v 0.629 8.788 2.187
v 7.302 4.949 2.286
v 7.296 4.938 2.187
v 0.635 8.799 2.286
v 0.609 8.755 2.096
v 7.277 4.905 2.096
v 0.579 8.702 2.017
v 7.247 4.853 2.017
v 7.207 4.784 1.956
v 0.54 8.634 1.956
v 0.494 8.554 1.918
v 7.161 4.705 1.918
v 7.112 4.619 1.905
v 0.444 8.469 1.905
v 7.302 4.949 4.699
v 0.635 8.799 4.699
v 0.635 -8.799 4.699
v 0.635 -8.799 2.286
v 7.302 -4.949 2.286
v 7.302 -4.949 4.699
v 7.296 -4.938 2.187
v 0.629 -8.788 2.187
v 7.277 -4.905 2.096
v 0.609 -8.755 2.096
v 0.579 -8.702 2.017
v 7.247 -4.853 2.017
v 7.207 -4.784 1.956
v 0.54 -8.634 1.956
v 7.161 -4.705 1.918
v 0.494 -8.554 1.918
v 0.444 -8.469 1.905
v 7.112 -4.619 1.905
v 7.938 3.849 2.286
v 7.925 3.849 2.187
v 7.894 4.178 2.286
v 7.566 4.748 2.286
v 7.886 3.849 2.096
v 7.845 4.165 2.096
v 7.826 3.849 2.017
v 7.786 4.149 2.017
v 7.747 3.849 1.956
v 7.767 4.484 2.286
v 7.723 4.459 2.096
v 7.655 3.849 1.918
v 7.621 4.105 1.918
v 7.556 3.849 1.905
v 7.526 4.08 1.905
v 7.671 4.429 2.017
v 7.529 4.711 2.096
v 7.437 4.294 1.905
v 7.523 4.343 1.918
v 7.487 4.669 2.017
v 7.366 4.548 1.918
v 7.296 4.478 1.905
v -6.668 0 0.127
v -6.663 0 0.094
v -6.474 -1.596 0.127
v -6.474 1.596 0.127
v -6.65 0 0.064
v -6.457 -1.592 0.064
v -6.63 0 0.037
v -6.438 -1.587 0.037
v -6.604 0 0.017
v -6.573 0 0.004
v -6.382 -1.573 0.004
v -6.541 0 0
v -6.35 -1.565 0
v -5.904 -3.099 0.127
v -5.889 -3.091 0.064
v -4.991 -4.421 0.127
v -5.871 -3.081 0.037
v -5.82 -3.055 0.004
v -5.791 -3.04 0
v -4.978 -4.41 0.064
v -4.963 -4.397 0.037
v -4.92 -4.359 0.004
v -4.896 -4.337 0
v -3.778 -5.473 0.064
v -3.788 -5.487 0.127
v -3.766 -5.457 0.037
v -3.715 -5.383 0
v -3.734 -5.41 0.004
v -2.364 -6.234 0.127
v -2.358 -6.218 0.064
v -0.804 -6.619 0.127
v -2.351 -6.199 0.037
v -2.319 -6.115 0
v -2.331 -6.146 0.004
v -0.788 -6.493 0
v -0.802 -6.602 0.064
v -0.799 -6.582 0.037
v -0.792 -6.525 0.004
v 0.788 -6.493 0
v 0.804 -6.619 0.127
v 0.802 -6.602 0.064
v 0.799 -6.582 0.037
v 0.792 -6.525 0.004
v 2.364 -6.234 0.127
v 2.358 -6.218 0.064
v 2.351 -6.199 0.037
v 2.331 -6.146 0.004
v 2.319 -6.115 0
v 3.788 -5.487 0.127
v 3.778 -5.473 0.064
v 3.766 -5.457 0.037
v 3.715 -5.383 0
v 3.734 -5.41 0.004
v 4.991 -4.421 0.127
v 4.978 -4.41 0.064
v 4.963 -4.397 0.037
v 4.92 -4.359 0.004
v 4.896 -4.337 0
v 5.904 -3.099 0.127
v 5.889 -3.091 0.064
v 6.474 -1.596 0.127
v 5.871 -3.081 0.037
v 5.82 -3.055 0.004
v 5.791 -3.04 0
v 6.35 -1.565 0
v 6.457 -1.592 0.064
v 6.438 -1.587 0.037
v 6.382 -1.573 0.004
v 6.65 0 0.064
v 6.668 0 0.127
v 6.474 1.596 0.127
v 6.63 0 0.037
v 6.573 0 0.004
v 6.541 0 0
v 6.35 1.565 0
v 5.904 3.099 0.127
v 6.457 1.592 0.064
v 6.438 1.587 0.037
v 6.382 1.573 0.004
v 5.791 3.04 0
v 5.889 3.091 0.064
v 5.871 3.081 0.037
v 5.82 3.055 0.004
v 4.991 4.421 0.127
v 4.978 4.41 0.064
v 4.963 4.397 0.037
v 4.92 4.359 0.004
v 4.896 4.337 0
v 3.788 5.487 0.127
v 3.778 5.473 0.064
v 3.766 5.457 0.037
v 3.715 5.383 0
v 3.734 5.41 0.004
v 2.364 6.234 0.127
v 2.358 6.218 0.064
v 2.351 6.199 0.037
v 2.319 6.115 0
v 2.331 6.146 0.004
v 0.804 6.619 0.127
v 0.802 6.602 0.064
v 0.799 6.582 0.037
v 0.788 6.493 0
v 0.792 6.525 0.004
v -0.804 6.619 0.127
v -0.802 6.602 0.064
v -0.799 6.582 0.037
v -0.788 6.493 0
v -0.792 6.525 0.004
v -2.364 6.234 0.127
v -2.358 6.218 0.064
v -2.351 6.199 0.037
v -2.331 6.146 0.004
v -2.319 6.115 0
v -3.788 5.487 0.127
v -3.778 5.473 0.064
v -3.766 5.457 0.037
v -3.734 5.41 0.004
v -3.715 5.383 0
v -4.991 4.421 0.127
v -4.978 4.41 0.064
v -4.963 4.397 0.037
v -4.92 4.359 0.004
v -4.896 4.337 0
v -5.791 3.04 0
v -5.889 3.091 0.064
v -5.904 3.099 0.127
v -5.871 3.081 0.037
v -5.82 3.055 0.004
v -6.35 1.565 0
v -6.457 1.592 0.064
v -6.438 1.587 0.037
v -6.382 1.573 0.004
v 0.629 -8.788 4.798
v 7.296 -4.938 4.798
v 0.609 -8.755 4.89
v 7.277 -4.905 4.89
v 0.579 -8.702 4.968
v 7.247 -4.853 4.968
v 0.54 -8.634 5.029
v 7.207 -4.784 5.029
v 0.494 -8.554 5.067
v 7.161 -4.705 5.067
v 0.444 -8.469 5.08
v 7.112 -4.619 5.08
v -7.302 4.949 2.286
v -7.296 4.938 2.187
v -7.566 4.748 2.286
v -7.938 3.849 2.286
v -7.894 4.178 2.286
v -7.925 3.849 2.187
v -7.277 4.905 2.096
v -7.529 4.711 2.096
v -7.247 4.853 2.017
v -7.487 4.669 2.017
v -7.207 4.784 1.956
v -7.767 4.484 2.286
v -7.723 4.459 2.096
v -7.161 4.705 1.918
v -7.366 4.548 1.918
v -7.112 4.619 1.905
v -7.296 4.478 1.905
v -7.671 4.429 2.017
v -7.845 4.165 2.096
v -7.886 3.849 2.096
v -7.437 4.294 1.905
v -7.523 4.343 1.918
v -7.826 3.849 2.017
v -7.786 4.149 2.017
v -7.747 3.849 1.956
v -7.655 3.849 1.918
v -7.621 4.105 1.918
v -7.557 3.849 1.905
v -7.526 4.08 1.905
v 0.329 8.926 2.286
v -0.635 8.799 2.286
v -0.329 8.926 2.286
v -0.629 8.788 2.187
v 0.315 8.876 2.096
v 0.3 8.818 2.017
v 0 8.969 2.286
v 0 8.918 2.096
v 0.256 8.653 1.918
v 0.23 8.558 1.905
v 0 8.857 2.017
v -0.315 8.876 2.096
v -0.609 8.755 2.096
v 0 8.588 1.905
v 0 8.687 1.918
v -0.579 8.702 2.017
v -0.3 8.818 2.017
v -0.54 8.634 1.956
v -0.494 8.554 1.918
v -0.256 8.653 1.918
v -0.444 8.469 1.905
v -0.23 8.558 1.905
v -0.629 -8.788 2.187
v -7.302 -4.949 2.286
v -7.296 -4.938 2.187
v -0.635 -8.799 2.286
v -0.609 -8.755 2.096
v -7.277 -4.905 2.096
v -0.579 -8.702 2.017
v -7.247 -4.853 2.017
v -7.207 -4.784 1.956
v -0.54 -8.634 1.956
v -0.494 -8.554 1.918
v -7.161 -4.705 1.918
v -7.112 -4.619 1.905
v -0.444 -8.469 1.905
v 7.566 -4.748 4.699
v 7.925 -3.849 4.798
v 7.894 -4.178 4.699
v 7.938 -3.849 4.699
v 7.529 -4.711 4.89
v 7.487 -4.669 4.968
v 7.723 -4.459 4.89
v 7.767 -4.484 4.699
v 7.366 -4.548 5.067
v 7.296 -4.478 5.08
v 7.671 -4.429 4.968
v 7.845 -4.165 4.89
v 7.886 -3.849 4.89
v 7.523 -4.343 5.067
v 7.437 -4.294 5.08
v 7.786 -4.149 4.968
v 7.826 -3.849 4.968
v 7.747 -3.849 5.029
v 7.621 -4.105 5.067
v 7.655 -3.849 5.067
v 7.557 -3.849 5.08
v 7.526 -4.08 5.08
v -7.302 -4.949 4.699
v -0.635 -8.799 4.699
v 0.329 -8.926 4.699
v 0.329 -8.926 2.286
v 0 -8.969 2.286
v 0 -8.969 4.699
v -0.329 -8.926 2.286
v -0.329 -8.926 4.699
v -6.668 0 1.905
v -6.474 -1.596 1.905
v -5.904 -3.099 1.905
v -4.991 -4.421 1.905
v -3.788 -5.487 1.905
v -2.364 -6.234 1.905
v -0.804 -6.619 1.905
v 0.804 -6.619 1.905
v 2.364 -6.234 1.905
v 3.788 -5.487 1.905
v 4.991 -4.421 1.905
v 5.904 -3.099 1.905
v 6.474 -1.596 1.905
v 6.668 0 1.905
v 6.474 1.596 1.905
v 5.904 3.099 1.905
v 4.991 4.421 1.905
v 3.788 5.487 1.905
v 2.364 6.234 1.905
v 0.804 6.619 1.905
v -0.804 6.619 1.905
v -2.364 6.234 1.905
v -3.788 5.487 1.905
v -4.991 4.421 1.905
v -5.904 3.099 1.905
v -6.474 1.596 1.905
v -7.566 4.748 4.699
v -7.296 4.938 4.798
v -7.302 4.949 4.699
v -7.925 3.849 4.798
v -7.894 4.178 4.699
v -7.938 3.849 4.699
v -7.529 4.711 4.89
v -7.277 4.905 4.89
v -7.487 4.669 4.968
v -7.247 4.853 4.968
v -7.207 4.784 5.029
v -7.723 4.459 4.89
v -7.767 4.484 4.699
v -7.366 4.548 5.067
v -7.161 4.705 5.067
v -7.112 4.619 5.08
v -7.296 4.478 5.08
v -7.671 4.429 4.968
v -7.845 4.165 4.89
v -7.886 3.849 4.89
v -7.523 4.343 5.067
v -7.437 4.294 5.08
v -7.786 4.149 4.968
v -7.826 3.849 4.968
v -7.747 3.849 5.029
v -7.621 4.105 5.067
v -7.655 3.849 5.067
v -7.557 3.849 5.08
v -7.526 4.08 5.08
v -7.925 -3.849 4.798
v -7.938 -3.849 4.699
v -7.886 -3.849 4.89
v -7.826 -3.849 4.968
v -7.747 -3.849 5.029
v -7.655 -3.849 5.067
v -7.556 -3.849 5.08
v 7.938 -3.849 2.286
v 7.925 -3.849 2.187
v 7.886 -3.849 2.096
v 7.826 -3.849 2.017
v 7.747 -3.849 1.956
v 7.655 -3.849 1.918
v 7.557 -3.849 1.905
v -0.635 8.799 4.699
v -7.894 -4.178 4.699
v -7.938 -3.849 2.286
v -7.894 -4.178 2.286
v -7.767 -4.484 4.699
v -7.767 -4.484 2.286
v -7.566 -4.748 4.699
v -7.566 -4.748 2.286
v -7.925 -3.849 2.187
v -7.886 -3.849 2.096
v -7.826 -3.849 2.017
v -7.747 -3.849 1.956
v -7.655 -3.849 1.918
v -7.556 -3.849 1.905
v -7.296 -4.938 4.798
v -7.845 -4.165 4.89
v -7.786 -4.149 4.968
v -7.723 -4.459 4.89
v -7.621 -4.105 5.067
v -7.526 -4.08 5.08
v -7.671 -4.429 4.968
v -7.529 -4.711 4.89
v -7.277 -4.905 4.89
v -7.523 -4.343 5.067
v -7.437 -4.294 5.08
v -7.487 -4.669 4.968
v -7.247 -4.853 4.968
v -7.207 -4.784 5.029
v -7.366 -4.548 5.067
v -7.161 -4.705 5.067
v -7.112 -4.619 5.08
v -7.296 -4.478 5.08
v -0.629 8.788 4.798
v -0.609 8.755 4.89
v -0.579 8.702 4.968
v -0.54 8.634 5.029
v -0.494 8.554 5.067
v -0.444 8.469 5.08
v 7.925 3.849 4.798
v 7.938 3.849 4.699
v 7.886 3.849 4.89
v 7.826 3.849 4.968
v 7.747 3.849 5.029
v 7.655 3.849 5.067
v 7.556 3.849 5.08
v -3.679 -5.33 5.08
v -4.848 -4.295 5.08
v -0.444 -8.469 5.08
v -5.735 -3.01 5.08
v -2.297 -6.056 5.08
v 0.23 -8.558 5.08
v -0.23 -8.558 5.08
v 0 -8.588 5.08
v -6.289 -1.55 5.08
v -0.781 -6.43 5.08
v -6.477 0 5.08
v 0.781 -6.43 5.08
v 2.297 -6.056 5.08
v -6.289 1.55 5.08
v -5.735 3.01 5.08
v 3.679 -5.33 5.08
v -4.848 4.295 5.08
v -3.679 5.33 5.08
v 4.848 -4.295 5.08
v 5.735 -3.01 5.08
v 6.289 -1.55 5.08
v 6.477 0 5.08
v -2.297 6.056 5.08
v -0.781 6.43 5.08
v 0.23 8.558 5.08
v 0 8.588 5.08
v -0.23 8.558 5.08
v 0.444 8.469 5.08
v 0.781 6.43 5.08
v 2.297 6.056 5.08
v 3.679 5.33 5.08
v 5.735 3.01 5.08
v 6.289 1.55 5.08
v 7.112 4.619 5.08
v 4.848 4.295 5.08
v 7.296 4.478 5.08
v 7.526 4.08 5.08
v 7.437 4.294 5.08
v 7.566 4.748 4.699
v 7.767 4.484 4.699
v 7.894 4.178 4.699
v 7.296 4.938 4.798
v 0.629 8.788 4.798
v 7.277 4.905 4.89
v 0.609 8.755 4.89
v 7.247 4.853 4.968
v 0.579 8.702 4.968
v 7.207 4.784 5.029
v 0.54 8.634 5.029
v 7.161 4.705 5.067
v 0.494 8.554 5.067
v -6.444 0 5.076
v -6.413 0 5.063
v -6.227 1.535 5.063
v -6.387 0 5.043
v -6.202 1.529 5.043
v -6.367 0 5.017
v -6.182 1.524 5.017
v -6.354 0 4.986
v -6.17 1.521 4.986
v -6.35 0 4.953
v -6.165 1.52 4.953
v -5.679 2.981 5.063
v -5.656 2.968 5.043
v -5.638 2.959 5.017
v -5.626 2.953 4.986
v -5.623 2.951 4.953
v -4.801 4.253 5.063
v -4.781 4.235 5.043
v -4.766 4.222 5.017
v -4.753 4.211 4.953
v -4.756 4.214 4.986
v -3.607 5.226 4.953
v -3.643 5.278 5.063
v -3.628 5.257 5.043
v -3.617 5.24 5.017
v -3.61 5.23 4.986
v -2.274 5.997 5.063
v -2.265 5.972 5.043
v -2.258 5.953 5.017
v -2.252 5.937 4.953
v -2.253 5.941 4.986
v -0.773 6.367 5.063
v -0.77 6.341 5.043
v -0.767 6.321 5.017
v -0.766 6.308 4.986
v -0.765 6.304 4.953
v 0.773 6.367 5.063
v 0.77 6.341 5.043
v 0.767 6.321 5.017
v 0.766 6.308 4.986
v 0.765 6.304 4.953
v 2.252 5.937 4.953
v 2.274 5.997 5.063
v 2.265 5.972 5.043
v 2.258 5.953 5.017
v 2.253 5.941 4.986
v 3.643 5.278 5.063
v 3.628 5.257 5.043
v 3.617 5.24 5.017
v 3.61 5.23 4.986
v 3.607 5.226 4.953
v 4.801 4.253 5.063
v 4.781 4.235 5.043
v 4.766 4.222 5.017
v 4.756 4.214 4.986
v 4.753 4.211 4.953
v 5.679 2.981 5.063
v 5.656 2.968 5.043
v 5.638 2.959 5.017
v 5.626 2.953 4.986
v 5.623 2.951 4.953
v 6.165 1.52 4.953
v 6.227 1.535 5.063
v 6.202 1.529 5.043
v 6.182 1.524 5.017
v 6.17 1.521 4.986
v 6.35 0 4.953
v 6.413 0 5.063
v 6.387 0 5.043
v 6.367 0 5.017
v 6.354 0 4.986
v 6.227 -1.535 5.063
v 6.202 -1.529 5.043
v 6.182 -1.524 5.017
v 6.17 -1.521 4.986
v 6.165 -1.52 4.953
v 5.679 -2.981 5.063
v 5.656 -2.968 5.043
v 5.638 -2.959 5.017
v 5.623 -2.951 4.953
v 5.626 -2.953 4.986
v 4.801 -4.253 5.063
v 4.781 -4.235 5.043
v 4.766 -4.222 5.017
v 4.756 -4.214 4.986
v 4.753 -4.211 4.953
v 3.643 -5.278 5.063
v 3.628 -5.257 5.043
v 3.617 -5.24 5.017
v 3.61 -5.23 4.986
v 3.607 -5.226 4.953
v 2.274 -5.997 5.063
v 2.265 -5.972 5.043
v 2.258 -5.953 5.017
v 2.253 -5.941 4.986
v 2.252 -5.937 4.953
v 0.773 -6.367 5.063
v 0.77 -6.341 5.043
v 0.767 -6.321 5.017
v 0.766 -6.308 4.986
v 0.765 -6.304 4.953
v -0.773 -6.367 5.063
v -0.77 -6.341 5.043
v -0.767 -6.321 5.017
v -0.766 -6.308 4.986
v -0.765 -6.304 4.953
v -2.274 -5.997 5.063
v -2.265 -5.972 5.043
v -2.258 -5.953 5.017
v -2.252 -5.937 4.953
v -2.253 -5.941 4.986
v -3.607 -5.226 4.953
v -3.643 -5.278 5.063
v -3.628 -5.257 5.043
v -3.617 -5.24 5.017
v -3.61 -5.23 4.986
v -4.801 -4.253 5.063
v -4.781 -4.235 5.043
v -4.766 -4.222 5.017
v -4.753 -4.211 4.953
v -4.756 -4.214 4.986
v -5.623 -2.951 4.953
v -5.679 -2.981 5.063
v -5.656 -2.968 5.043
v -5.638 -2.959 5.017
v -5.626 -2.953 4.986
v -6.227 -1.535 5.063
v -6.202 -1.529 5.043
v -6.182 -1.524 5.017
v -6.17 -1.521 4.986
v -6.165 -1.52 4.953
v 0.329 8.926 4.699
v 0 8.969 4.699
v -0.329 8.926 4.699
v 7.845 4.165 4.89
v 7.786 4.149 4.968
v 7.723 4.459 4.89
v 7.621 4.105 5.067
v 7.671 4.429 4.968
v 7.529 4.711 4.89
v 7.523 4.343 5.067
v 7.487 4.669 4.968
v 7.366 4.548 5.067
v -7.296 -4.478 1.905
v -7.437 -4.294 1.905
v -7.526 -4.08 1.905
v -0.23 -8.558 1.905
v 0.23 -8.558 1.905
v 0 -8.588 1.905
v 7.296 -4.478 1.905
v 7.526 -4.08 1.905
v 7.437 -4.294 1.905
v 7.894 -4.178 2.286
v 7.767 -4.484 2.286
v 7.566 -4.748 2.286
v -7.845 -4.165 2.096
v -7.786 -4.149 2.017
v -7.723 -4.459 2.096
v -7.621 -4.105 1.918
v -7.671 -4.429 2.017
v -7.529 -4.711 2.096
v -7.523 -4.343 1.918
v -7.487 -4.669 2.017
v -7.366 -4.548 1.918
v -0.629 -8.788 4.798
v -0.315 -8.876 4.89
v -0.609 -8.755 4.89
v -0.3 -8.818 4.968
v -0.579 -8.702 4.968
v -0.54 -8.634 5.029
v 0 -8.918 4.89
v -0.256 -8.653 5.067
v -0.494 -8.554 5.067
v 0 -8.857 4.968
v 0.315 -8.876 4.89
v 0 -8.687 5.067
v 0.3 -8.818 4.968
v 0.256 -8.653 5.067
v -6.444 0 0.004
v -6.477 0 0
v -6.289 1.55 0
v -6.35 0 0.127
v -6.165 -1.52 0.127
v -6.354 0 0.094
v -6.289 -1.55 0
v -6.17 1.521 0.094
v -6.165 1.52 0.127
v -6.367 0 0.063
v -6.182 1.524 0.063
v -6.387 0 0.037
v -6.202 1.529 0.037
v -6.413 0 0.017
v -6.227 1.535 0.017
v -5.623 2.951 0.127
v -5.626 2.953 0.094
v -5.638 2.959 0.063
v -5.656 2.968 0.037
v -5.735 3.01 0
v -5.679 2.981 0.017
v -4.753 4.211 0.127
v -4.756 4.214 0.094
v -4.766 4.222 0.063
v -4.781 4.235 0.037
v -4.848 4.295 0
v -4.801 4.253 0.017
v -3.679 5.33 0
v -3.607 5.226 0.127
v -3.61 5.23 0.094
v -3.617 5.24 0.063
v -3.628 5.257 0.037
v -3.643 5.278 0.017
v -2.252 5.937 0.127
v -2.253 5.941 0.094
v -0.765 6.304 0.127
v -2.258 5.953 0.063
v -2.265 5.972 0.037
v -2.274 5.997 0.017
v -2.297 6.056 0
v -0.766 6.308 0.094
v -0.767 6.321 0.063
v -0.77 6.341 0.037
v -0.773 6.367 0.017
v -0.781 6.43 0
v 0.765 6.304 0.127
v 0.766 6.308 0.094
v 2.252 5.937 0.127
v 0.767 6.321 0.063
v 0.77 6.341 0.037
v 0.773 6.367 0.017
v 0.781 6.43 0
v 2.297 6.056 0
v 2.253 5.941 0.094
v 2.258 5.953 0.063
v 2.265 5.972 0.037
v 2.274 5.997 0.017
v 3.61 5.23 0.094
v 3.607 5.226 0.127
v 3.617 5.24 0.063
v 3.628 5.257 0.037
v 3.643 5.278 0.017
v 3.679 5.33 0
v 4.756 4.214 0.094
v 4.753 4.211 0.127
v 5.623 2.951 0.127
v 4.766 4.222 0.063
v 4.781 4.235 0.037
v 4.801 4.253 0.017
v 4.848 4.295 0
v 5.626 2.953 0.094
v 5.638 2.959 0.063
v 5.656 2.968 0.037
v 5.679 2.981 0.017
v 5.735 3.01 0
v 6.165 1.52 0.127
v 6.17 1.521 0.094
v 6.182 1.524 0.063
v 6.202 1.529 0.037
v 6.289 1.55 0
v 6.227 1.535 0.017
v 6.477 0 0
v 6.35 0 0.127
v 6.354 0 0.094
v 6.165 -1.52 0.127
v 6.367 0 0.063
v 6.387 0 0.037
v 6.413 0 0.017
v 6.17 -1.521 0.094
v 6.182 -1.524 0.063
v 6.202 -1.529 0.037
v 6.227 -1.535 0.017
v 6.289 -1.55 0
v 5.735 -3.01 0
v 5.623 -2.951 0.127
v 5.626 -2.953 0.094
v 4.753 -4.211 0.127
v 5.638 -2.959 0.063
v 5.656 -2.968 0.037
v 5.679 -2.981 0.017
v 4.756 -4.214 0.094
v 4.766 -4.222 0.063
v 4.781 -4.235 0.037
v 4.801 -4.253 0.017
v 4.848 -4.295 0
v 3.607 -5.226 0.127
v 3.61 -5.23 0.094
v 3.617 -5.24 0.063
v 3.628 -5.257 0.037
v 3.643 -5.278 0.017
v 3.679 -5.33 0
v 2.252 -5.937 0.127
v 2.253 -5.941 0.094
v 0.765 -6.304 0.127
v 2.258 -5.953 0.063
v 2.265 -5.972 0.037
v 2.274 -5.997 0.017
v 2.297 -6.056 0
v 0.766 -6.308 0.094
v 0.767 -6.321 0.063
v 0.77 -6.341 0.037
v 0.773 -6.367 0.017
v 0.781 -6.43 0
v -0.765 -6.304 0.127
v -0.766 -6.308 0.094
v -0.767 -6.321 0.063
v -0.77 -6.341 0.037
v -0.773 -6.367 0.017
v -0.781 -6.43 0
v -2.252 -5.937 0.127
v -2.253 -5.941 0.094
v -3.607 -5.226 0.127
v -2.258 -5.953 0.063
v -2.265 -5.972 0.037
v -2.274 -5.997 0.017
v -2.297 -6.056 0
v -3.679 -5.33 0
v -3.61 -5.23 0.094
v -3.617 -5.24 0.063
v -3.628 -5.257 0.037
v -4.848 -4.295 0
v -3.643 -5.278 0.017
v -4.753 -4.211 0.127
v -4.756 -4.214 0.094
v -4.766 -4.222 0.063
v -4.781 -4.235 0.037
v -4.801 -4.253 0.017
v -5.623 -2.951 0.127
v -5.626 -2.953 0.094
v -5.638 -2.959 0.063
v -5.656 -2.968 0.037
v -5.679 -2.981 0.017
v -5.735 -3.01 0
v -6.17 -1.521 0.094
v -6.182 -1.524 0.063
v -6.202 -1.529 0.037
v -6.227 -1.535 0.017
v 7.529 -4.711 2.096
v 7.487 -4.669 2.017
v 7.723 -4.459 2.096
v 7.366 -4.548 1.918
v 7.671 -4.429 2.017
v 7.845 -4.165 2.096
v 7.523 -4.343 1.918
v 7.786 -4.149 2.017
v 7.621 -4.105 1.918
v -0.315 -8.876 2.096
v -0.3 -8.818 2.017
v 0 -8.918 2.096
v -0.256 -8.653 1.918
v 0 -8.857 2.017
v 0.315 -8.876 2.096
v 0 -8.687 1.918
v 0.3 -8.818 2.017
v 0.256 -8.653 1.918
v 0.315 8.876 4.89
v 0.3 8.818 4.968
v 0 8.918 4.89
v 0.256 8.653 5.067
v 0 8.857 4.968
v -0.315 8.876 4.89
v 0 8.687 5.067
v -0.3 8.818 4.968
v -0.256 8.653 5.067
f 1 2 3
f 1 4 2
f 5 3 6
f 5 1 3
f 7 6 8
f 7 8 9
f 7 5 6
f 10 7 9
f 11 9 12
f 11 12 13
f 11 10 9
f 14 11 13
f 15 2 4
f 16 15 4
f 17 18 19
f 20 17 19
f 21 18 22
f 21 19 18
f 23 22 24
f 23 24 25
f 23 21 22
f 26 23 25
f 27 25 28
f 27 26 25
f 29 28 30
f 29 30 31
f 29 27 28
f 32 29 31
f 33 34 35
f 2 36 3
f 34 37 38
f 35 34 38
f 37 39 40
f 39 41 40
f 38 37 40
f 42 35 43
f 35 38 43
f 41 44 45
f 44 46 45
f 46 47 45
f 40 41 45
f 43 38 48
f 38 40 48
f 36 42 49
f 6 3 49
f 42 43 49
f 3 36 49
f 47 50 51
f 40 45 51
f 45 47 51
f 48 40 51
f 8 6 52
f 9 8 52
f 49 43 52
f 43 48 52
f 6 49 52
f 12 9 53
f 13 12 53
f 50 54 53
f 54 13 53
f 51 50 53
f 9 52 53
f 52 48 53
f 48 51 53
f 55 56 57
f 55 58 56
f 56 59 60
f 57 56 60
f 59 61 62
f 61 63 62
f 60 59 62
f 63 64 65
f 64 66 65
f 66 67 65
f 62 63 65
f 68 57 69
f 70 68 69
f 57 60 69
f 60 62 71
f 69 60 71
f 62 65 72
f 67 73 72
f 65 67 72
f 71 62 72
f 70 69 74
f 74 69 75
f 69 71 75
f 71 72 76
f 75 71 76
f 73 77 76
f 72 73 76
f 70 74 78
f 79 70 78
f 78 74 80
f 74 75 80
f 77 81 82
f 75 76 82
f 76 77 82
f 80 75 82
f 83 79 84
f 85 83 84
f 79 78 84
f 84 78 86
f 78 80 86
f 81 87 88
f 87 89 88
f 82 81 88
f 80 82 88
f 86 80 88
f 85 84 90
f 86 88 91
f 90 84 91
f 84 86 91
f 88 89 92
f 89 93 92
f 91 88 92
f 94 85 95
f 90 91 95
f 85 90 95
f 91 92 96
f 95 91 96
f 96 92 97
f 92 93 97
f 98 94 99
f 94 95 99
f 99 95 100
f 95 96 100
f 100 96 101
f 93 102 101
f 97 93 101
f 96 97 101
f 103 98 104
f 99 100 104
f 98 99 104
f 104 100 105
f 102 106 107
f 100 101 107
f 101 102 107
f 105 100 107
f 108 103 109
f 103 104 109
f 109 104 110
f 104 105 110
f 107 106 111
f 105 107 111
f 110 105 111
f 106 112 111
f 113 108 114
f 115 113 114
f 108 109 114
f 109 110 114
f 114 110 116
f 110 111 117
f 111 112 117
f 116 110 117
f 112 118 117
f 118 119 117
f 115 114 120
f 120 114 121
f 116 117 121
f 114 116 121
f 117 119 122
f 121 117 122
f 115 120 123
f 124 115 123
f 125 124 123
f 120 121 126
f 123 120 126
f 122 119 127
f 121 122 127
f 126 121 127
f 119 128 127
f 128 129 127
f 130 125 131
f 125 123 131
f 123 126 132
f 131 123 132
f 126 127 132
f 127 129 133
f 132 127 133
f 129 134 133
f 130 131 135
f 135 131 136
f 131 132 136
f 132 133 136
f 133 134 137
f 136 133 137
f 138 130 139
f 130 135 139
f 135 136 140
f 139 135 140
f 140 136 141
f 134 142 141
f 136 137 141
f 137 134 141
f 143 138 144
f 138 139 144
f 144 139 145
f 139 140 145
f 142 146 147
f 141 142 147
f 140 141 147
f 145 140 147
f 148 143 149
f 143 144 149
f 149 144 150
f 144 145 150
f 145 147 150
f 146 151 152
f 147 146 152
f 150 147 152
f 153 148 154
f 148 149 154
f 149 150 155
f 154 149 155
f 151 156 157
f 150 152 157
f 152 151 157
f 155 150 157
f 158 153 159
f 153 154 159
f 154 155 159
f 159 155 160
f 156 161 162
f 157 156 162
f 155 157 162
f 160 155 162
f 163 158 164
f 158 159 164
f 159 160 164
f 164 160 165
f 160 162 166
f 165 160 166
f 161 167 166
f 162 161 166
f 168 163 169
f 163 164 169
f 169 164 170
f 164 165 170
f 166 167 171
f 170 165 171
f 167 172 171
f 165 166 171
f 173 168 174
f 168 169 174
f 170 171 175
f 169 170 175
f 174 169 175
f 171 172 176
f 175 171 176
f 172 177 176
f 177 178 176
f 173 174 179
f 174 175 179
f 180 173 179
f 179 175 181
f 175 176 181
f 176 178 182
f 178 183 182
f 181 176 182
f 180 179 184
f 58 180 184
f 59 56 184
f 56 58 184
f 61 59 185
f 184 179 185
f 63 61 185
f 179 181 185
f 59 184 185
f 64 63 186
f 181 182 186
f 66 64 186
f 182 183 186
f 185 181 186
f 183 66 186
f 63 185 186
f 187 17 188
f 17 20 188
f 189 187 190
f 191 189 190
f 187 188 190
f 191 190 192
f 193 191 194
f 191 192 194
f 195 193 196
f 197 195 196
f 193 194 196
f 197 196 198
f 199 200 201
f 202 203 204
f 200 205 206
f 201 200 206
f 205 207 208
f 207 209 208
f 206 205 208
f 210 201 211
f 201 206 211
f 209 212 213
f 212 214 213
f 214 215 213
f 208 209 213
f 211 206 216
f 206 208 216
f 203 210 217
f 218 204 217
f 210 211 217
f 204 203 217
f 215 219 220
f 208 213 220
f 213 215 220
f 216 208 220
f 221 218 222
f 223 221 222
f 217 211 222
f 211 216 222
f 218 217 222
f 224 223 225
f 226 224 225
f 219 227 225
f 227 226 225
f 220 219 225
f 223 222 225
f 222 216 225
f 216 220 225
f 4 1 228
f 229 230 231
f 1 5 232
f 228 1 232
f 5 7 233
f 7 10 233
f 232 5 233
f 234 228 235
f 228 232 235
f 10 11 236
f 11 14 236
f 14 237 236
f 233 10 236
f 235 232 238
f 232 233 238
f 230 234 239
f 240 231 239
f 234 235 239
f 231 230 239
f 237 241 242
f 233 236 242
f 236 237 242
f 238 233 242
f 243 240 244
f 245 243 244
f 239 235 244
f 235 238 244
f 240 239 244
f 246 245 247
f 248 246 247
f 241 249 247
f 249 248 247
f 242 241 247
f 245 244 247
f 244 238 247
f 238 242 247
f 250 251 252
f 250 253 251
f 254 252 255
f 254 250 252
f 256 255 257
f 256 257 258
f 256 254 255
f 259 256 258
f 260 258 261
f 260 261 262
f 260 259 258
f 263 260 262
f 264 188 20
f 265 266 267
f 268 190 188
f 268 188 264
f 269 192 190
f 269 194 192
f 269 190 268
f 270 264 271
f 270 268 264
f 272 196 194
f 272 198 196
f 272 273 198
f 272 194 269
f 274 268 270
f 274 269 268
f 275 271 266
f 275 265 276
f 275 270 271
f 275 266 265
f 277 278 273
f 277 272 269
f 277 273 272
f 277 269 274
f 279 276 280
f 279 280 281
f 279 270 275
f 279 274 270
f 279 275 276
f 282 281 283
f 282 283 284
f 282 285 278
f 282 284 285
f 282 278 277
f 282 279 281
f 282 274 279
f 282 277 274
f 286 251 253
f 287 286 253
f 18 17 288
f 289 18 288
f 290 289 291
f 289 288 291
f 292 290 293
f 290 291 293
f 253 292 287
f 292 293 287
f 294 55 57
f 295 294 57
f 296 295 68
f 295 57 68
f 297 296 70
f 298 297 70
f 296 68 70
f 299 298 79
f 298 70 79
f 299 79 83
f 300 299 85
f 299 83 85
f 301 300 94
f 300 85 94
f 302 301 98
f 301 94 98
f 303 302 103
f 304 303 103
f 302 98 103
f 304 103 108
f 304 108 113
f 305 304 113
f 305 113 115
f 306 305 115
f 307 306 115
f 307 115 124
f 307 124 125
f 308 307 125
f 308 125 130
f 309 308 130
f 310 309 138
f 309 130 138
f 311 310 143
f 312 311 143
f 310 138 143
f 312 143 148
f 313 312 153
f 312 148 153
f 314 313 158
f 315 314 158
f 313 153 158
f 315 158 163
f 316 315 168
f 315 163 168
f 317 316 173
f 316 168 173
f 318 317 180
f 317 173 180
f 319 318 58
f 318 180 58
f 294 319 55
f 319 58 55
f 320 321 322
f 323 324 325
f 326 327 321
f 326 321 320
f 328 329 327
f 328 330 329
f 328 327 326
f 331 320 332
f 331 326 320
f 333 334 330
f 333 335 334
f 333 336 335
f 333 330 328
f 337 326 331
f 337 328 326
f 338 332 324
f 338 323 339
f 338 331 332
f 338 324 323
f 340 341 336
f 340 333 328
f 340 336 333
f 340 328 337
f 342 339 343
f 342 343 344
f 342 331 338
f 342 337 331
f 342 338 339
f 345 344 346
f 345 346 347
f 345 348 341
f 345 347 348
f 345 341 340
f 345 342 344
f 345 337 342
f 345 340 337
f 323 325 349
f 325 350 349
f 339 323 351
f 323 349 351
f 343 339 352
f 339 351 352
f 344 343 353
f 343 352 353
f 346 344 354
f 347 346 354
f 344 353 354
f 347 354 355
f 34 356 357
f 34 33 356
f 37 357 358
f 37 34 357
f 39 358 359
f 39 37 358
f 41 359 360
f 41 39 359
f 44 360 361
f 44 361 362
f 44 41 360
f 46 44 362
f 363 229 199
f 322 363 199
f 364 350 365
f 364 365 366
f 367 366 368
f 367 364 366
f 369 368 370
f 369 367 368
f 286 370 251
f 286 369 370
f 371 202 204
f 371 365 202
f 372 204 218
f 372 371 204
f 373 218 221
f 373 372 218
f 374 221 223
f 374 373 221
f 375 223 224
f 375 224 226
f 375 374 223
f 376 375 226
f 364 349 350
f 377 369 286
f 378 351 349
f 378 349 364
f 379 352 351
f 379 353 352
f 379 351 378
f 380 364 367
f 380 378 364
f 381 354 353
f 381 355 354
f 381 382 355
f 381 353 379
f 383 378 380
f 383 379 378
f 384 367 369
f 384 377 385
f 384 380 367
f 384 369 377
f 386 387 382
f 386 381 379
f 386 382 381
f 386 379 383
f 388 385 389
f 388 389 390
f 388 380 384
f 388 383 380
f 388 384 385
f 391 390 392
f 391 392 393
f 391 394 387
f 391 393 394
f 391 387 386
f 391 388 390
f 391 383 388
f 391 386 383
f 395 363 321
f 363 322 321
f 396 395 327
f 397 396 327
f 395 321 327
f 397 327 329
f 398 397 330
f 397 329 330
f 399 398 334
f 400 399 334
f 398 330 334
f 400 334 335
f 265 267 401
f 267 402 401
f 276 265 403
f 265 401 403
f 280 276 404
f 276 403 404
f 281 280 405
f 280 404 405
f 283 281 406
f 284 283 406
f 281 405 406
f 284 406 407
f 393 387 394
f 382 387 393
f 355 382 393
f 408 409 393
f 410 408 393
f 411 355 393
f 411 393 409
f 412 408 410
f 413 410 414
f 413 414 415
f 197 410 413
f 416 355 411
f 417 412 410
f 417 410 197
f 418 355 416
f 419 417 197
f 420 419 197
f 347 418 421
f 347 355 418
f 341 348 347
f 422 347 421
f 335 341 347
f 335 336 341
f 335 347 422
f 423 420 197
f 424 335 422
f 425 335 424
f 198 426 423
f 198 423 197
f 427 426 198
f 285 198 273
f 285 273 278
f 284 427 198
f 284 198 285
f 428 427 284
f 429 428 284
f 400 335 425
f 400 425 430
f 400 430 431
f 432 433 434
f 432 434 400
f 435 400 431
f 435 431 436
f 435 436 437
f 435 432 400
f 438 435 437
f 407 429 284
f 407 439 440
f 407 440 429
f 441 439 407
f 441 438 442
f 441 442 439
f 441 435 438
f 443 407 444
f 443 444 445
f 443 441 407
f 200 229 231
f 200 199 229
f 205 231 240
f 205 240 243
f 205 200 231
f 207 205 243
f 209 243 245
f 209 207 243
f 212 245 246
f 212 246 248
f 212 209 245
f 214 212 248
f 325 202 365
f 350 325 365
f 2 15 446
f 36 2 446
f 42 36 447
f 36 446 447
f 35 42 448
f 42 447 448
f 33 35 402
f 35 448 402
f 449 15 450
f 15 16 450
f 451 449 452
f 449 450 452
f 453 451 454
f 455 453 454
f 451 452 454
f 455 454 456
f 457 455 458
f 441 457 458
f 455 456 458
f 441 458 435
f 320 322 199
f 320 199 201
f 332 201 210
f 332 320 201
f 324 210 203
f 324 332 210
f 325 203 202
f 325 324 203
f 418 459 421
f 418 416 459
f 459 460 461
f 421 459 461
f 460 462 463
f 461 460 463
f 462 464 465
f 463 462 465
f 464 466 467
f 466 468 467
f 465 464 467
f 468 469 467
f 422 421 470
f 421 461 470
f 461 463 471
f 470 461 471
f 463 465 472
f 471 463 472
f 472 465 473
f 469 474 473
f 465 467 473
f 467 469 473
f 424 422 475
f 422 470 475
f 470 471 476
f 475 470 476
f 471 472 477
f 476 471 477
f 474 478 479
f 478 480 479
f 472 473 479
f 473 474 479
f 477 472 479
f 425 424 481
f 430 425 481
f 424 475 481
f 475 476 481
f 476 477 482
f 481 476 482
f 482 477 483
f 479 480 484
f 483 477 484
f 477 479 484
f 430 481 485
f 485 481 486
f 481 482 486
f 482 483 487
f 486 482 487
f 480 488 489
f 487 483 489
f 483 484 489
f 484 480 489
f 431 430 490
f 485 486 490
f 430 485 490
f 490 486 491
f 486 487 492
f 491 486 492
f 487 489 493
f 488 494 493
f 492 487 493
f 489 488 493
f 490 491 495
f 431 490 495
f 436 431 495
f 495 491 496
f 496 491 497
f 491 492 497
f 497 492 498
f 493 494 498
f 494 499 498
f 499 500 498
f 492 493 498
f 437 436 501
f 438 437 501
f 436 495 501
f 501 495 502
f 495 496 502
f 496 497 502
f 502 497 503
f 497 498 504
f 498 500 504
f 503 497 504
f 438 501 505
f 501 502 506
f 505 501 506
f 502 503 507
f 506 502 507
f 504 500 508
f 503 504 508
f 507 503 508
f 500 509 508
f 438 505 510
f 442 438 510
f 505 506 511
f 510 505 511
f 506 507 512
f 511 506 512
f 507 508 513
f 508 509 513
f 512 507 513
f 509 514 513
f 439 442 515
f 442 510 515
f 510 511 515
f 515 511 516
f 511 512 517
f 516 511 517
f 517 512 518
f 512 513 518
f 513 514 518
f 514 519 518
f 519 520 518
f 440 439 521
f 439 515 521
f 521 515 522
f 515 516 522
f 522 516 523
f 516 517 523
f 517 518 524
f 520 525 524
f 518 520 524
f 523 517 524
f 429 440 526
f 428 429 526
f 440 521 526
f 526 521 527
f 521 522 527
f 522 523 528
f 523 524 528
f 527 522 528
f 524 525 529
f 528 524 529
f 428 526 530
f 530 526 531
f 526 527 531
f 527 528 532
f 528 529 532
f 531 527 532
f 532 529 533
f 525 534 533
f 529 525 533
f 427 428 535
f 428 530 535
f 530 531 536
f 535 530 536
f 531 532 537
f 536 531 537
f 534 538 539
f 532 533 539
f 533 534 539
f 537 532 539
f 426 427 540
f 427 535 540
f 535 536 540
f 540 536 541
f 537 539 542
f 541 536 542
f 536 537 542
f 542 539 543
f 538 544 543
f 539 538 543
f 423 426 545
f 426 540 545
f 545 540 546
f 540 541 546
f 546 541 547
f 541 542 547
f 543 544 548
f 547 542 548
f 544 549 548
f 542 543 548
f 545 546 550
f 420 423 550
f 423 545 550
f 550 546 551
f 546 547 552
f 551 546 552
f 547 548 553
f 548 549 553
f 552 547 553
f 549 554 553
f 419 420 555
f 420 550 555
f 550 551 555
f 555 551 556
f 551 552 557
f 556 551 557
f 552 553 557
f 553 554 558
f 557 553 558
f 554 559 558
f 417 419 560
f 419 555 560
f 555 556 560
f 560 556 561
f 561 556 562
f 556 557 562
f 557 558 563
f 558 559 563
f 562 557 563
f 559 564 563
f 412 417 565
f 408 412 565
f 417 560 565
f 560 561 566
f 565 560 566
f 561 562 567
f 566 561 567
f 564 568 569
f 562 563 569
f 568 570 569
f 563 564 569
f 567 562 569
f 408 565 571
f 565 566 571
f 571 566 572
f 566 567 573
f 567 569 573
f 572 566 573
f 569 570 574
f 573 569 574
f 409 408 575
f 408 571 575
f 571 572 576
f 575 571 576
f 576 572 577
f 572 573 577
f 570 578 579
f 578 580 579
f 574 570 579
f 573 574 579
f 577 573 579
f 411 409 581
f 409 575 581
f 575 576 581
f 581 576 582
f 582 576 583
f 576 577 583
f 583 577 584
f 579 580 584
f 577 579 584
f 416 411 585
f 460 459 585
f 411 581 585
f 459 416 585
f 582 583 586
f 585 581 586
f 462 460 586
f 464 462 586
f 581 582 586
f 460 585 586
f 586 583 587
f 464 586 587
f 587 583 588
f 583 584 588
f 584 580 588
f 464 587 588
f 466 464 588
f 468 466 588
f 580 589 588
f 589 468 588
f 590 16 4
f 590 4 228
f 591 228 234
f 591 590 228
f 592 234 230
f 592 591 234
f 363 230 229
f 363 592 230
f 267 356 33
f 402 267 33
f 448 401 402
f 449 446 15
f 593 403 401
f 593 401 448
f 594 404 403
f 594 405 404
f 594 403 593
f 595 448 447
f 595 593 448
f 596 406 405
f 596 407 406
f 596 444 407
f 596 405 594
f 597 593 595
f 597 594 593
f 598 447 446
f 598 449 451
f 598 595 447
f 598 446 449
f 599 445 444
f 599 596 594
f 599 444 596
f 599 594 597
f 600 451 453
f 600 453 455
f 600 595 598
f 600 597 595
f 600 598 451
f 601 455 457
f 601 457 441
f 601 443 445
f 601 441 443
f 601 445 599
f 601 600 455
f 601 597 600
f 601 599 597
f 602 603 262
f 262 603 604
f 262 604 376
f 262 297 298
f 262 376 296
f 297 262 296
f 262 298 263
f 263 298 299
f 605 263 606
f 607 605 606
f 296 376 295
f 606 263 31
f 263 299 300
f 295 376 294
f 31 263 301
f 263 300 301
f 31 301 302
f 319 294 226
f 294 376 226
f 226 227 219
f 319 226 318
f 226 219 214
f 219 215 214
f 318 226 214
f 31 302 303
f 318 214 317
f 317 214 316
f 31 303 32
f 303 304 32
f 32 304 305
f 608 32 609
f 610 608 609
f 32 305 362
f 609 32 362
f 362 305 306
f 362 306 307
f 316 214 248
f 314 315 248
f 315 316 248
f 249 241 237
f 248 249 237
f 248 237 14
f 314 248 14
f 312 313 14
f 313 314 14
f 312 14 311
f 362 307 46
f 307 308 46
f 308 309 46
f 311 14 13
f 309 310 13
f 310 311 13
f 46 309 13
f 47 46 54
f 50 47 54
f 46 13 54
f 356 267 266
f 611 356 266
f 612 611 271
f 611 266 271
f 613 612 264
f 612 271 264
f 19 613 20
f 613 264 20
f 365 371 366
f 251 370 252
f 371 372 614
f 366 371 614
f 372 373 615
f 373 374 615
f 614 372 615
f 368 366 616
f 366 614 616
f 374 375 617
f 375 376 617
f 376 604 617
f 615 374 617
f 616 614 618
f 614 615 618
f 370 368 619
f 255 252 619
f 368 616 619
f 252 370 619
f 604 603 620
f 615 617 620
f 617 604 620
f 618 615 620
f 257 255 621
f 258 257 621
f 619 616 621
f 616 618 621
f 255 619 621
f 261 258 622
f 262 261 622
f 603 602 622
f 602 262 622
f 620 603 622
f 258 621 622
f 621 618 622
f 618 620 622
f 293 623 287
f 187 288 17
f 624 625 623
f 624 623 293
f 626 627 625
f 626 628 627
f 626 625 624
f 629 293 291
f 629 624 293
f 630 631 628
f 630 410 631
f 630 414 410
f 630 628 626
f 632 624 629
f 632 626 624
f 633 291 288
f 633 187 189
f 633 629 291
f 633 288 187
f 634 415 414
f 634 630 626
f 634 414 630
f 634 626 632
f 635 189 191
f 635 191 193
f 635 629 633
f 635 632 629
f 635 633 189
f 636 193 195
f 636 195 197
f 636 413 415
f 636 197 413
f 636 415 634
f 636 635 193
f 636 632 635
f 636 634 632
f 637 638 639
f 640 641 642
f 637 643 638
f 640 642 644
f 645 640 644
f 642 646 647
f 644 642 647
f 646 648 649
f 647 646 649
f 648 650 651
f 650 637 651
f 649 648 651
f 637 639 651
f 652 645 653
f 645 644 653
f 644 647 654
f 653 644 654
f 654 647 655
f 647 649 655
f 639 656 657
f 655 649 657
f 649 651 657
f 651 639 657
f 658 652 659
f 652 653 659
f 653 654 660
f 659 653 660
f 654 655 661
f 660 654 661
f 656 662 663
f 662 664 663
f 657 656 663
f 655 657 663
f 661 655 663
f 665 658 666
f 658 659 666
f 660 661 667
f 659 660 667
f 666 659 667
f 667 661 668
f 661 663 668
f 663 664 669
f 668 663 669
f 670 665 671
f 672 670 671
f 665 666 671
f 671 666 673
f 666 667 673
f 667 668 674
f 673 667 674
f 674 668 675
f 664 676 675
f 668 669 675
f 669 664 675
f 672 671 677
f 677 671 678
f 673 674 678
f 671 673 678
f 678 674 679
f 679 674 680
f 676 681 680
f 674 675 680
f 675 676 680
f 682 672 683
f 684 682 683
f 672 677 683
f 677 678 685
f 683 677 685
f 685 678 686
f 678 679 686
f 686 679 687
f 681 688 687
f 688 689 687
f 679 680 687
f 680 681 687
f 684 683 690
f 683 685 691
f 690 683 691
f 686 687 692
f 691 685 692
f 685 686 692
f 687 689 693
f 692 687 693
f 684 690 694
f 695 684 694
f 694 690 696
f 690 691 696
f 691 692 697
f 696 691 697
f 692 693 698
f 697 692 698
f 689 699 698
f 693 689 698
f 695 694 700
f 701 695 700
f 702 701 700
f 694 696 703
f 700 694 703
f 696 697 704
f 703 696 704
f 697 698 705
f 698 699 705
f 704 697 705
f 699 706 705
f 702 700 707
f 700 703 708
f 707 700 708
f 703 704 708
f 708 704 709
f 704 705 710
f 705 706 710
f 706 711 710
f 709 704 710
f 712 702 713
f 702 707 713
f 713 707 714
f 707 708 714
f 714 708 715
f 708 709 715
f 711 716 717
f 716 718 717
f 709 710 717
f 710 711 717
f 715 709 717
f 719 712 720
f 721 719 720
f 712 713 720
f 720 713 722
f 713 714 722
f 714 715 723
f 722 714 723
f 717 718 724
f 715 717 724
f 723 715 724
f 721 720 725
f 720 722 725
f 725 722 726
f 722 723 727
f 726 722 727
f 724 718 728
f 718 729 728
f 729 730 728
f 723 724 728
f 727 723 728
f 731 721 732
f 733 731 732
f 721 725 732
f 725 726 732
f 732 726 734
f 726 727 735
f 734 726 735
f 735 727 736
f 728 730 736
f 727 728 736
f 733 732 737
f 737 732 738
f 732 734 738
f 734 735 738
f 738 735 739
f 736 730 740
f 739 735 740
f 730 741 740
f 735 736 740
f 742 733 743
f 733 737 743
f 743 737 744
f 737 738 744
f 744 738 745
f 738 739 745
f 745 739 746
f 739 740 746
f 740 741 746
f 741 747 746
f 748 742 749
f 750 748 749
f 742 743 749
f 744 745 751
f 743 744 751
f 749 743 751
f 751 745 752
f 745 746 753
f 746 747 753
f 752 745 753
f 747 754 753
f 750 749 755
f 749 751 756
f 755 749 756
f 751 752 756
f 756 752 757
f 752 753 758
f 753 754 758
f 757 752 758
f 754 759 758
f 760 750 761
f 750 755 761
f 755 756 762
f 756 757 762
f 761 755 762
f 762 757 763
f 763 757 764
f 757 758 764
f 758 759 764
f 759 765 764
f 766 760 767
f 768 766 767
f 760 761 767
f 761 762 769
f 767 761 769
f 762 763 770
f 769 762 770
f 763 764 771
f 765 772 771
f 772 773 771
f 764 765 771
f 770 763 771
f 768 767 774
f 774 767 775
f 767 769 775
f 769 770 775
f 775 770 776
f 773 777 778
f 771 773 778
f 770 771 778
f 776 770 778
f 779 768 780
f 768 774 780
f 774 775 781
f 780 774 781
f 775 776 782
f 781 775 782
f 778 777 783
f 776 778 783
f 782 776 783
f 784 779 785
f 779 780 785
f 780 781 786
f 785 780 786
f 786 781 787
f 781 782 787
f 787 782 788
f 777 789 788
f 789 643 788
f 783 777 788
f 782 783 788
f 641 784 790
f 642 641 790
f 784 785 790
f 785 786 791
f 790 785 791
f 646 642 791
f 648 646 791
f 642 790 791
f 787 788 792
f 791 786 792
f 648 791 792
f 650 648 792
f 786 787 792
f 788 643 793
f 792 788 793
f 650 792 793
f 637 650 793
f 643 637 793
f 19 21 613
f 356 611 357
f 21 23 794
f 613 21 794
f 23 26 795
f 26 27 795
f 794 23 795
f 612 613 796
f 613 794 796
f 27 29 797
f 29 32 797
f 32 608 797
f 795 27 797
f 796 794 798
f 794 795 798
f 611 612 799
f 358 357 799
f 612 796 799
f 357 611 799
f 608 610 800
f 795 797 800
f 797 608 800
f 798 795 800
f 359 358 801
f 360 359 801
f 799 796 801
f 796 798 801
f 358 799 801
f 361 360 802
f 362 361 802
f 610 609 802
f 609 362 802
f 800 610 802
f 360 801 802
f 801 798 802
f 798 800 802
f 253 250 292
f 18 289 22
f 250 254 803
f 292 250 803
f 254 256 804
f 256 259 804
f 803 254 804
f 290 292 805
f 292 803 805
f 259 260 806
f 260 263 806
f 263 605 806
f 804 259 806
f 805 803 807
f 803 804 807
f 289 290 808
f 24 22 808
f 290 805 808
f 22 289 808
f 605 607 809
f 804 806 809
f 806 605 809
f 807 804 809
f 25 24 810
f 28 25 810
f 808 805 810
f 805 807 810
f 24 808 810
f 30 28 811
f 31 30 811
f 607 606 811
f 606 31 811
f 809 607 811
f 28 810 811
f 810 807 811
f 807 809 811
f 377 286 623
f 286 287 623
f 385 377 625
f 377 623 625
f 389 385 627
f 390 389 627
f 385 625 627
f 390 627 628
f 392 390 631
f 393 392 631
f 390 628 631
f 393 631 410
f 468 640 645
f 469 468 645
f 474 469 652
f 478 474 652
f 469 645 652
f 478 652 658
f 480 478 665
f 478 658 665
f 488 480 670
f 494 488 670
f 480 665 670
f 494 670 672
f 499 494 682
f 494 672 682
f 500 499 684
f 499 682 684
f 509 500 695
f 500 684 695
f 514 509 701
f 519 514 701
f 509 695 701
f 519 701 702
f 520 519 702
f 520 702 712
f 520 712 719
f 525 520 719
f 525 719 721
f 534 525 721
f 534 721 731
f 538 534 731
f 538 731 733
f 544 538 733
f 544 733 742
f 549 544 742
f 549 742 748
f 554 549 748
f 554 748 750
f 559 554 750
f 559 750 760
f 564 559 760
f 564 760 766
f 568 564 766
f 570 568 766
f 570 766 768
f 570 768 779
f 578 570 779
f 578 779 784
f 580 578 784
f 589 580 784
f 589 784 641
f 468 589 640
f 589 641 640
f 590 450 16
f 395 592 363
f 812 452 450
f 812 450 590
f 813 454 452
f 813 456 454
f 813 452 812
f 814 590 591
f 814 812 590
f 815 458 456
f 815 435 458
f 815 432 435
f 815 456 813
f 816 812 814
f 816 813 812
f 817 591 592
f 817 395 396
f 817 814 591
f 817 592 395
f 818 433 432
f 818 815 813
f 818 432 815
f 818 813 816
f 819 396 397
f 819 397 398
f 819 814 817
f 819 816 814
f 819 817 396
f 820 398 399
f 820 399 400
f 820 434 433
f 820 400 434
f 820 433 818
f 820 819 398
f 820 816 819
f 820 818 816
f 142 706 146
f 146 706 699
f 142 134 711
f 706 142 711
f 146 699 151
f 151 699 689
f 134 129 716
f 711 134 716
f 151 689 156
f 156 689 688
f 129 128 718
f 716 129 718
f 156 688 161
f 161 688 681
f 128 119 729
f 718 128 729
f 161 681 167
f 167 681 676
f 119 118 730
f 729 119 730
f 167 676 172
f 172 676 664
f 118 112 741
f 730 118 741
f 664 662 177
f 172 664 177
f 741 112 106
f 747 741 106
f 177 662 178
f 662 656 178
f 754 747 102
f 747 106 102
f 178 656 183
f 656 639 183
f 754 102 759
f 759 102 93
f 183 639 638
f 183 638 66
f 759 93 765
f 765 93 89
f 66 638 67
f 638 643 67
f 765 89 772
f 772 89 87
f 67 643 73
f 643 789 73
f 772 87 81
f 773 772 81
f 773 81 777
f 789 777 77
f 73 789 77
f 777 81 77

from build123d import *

# Parameters (mm, degrees)
SKETCH1_R           = 6.6675
BOSS_EXTRUDE1_DEPTH = 1.905
BOSS_EXTRUDE2_DEPTH = 3.175
SKETCH3_R           = 6.35
CUT_EXTRUDE1_DEPTH  = 14.145931484
FILLET1_R           = 1.27
FILLET2_R           = 0.381
FILLET3_R           = 0.127


with BuildPart() as part:
    # Sketch1 → Boss-Extrude1 (new body)
    with BuildSketch(Plane.XY):
        with Locations(Location((0, 0, 0), (0, 0, 180))):
            Circle(SKETCH1_R)
    extrude(amount=BOSS_EXTRUDE1_DEPTH)

    # Sketch2 → Boss-Extrude2 (add)
    with BuildSketch(Plane.XY.offset(1.905)):
        Polygon((7.9375, 4.582717762), (0, 9.165435523), (-7.9375, 4.582717762), (-7.9375, -4.582717762), (0, -9.165435523), (7.9375, -4.582717762), align=None)
    extrude(amount=BOSS_EXTRUDE2_DEPTH)

    # Sketch3 → Cut-Extrude1 (cut, through all)
    with BuildSketch(Plane(origin=(0, 0, 0), x_dir=(-1, 0, 0), z_dir=(0, 0, -1))):
        Circle(SKETCH3_R)
    extrude(amount=-CUT_EXTRUDE1_DEPTH, mode=Mode.SUBTRACT)

    # Fillet1
    fillet1_edges = [part.edges().sort_by_distance(p)[0] for p in [
        (7.9375, 4.582717762, 3.4925),
        (0, 9.165435523, 3.4925),
        (-7.9375, 4.582717762, 3.4925),
        (-7.9375, -4.582717762, 3.4925),
        (0, -9.165435523, 3.4925),
        (7.9375, -4.582717762, 3.4925),
    ]]
    fillet(fillet1_edges, radius=FILLET1_R)

    # Fillet2
    fillet2_edges = [part.edges().sort_by_distance(p)[0] for p in [
        (3.96875, 6.874076643, 1.905),
        (3.96875, 6.874076643, 5.08),
        (7.9375, 0, 1.905),
        (3.96875, -6.874076643, 1.905),
        (-3.96875, -6.874076643, 1.905),
        (-7.9375, 0, 1.905),
        (-3.96875, 6.874076643, 1.905),
        (0, 8.96896584, 1.905),
        (-7.767352263, 4.48448292, 1.905),
        (-7.767352263, -4.48448292, 1.905),
        (0, -8.96896584, 1.905),
        (7.767352263, -4.48448292, 1.905),
        (7.767352263, 4.48448292, 1.905),
        (7.9375, 0, 5.08),
        (-3.96875, 6.874076643, 5.08),
        (-7.9375, 0, 5.08),
        (-3.96875, -6.874076643, 5.08),
        (3.96875, -6.874076643, 5.08),
        (0, 8.96896584, 5.08),
        (-7.767352263, 4.48448292, 5.08),
        (-7.767352263, -4.48448292, 5.08),
        (0, -8.96896584, 5.08),
        (7.767352263, -4.48448292, 5.08),
        (7.767352263, 4.48448292, 5.08),
    ]]
    fillet(fillet2_edges, radius=FILLET2_R)

    # Fillet3
    fillet3_edges = [part.edges().sort_by_distance(p)[0] for p in [
        (6.6675, 0, 0),
        (6.35, 0, 5.08),
        (6.35, 0, 0),
    ]]
    fillet(fillet3_edges, radius=FILLET3_R)


solid = part.part
